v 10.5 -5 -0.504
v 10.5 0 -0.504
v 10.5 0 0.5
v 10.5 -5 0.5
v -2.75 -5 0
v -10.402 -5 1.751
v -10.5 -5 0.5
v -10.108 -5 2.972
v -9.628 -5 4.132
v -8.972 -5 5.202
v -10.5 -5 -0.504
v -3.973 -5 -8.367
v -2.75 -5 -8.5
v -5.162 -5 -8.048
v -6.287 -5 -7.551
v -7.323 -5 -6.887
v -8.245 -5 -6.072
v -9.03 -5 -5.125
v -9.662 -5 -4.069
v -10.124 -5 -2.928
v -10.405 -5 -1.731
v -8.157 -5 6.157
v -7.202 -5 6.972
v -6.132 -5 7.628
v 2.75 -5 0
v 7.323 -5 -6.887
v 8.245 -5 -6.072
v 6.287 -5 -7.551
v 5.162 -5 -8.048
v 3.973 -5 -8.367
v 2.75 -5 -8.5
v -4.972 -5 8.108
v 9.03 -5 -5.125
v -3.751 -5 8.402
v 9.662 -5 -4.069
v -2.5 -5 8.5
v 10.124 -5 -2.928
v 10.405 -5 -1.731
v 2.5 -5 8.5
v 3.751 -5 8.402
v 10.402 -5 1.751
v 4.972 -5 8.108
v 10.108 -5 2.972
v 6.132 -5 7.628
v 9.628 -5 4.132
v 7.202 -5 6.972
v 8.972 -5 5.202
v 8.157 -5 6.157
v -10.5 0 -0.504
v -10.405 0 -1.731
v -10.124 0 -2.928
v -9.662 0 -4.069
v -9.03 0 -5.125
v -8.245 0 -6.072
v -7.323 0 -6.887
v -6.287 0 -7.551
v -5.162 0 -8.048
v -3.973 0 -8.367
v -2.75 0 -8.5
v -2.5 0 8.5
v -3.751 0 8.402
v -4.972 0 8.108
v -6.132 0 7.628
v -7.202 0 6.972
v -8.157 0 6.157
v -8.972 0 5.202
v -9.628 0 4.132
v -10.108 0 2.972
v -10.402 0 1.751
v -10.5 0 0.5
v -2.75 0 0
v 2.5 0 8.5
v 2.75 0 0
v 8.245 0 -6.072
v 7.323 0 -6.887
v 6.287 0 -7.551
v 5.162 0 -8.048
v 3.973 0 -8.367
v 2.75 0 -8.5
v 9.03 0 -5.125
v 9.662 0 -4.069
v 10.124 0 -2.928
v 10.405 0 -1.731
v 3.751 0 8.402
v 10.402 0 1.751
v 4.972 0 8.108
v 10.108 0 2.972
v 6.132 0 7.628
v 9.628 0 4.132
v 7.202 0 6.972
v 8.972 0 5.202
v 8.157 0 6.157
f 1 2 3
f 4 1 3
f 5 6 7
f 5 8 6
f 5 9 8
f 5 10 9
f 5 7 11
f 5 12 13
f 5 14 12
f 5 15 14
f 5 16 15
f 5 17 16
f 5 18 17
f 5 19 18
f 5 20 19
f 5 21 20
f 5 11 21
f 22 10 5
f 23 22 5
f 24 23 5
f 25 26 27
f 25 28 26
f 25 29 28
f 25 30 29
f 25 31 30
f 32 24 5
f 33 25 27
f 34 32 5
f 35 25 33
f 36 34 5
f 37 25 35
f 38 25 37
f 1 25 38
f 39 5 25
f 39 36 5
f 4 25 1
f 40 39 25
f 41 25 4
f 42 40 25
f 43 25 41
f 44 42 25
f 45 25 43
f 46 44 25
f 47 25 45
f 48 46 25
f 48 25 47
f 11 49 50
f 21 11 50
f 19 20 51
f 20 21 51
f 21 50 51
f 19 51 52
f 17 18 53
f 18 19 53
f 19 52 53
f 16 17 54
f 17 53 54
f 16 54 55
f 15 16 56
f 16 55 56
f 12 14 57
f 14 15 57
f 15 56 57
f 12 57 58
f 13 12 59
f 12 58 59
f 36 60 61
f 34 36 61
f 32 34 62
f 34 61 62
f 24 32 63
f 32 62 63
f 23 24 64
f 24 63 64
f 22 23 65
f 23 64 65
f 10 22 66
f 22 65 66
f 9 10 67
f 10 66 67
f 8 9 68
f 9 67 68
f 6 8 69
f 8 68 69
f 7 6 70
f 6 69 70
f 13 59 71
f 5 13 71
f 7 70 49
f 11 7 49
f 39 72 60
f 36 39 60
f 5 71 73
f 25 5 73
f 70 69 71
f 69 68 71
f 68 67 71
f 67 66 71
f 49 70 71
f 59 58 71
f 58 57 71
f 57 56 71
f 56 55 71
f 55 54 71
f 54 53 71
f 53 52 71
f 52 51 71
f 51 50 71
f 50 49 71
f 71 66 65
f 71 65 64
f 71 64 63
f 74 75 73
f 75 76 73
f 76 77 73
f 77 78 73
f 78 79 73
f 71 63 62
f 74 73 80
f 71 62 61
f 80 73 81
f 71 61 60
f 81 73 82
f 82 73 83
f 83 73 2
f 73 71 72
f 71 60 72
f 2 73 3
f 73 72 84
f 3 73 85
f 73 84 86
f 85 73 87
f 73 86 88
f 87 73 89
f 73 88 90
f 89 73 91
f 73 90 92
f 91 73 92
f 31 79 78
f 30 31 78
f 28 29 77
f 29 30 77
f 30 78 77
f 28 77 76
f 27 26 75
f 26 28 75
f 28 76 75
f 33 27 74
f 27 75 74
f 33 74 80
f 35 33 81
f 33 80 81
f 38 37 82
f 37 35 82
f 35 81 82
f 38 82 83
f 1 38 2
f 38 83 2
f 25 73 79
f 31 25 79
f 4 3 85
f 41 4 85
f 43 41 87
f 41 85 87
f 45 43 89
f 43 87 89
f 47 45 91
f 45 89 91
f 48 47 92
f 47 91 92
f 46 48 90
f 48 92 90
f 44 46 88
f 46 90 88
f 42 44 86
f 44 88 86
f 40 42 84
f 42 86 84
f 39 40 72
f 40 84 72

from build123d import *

# Parameters (mm, degrees)
F1_DEPTH    = 5
F2_T1_DEPTH = 45
F2_T3_DEPTH = 44.9804639793


# Not quite as in the source:
# - a fillet or chamfer that OpenCascade refuses, or shapes differently, is made with other operations: its cross-section is extruded or revolved along the edge and cut away or added


with BuildPart() as f1:
    # F0 (on Front) → F1 (new body)
    with BuildSketch(Plane.XZ):
        Polygon((2.75, -8.5), (10.5, -8.5), (10.5, 8.5), (-10.5, 8.5), (-10.5, -8.5), (-2.75, -8.5), (-2.75, 0), (2.75, 0), align=None)
    extrude(amount=F1_DEPTH)

    # F2: fillet of radius 8 on 4 edges, made by hand

    # F2_s2 → F2_t1 (cut)
    with BuildSketch(Plane.XZ.offset(-20)):
        with BuildLine():
            ThreePointArc((-2.5, 8.5), (-8.1568542495, 6.1568542495), (-10.5, 0.5))
            Line((-10.5, 0.5), (-10.5, 8.5))
            Line((-10.5, 8.5), (-2.5, 8.5))
        make_face()
        with BuildLine():
            ThreePointArc((10.5, 0.5), (8.1568542495, 6.1568542495), (2.5, 8.5))
            Line((2.5, 8.5), (10.5, 8.5))
            Line((10.5, 8.5), (10.5, 0.5))
        make_face()
    extrude(amount=F2_T1_DEPTH, mode=Mode.SUBTRACT)

    # F2_s4 → F2_t3 (cut)
    with BuildSketch(Plane.XZ.offset(-19.9902319896)):
        with BuildLine():
            ThreePointArc((2.75, -8.5), (8.2445626465, -6.071671567), (10.5, -0.5039072041))
            Line((10.5, -0.5039072041), (10.5, -8.5))
            Line((10.5, -8.5), (2.75, -8.5))
        make_face()
        with BuildLine():
            ThreePointArc((-10.5, -0.5039072041), (-8.2445626465, -6.071671567), (-2.75, -8.5))
            Line((-2.75, -8.5), (-10.5, -8.5))
            Line((-10.5, -8.5), (-10.5, -0.5039072041))
        make_face()
    extrude(amount=F2_T3_DEPTH, mode=Mode.SUBTRACT)


solid = f1.part
